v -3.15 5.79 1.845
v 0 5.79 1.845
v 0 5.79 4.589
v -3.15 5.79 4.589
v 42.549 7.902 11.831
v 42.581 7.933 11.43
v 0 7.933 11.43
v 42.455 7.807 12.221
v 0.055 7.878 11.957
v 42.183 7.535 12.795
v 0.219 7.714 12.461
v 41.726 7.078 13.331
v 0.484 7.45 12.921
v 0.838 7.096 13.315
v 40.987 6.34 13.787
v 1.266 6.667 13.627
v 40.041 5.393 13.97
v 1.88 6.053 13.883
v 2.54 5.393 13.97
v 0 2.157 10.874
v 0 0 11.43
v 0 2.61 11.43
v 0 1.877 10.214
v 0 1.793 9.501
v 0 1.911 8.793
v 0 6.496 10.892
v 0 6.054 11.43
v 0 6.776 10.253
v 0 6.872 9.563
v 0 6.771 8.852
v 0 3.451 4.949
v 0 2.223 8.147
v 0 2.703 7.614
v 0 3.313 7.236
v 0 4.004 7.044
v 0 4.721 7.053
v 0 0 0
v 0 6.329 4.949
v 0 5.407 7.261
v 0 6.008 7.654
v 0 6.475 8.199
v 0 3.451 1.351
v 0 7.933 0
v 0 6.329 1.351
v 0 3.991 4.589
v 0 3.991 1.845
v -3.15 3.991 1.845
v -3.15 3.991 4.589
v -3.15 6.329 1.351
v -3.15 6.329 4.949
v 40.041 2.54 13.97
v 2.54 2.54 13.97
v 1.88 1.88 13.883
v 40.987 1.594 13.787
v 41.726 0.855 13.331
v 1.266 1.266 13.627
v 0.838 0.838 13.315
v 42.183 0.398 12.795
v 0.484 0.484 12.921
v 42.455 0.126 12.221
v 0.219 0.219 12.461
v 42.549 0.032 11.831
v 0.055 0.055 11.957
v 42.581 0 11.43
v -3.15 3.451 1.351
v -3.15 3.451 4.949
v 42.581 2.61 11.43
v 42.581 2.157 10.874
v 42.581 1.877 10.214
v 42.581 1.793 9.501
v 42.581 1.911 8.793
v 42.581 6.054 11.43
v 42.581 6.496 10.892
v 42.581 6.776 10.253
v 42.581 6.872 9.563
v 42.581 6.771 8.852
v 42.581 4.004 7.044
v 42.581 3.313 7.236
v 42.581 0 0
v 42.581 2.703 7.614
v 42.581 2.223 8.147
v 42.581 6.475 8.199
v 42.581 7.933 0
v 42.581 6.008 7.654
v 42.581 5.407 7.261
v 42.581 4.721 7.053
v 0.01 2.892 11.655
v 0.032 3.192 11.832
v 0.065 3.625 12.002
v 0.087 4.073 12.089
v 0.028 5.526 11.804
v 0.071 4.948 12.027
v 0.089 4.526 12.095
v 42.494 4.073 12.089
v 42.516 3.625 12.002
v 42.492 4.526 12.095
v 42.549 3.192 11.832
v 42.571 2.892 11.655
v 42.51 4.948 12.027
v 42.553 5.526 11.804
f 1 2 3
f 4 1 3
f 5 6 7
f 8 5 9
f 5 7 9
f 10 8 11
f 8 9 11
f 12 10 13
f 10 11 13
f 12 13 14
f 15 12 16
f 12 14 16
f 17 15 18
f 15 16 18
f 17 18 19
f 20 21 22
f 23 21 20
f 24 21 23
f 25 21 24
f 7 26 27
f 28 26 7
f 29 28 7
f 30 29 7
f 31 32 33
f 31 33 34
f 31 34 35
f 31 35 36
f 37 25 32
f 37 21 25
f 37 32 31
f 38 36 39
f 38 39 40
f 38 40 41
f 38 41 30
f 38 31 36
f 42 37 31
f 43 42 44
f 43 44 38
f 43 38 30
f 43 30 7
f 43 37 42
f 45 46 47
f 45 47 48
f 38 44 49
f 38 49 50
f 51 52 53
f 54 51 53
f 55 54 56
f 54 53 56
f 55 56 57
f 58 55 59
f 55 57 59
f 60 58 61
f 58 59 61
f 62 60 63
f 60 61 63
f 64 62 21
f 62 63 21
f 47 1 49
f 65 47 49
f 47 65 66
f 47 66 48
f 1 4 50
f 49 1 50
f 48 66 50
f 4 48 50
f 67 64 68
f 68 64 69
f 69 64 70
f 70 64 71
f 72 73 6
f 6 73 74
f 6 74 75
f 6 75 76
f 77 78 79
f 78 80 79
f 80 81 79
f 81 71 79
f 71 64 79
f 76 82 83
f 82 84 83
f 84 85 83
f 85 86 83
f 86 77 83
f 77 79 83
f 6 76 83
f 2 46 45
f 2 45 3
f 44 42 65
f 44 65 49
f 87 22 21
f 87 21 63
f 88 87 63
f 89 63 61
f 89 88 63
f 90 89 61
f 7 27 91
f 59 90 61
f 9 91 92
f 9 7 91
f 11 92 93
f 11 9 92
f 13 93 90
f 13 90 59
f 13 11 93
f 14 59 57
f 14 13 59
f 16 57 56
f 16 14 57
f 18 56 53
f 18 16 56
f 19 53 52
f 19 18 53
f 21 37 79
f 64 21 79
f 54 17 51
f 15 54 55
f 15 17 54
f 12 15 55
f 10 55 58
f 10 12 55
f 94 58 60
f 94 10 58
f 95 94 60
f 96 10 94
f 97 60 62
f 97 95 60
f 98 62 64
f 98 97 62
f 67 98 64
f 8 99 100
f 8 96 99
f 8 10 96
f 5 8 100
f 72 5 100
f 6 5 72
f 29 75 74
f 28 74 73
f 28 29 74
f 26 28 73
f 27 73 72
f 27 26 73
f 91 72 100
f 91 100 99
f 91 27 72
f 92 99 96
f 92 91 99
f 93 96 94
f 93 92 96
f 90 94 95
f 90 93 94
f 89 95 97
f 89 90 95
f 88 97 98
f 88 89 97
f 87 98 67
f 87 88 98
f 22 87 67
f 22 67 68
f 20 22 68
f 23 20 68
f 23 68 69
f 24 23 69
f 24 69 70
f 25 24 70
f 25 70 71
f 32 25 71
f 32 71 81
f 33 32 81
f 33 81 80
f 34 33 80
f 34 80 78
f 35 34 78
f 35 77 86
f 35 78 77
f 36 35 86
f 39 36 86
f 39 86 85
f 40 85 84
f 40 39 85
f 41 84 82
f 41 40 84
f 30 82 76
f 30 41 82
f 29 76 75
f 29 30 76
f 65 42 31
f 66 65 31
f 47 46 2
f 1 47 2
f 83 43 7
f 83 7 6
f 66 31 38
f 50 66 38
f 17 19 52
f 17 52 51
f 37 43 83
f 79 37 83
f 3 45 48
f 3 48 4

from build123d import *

# Parameters (mm, degrees)
F0_W        = 42.580999434
F0_H        = 7.9333577305
F1_DEPTH    = 13.97
F2_R        = 2.54
F3_DEPTH    = 45.0342
F4_T1_DEPTH = 20.6333577305
F4_T3_DEPTH = 55.280999434
F5_W        = 2.8782505542
F5_H        = 3.5978133092
F5_W_2      = 1.7989068292
F5_H_2      = 2.7433328796
F6_DEPTH    = 3.1496


# Not quite as in the source:
# - a fillet or chamfer that OpenCascade refuses, or shapes differently, is made with other operations: its cross-section is extruded or revolved along the edge and cut away or added


with BuildPart() as f1:
    # F0 (on Top) → F1 (new body)
    with BuildSketch(Plane.XY):
        with Locations((21.290499717, 3.9666788653)):
            Rectangle(F0_W, F0_H)
    extrude(amount=F1_DEPTH)

    # F2 (on Right) → F3 (cut)
    with BuildSketch(Plane.YZ):
        with Locations((4.3319589458, 9.5625361428)):
            Circle(F2_R)
    extrude(amount=F3_DEPTH, mode=Mode.SUBTRACT)

    # F4: fillet of radius 2.54 on 4 edges, made by hand

    # F4_s2 → F4_t1 (cut)
    with BuildSketch(Plane.XZ.offset(-14.2833577305)):
        with BuildLine():
            ThreePointArc((0, 11.43), (0.7439487758, 13.2260512242), (2.54, 13.97))
            Line((2.54, 13.97), (0, 13.97))
            Line((0, 13.97), (0, 11.43))
        make_face()
        with BuildLine():
            ThreePointArc((40.040999434, 13.97), (41.8370506582, 13.2260512242), (42.580999434, 11.43))
            Line((42.580999434, 11.43), (42.580999434, 13.97))
            Line((42.580999434, 13.97), (40.040999434, 13.97))
        make_face()
    extrude(amount=F4_T1_DEPTH, mode=Mode.SUBTRACT)

    # F4_s4 → F4_t3 (cut)
    with BuildSketch(Plane.YZ.offset(-6.35)):
        with BuildLine():
            ThreePointArc((7.9333577305, 11.43), (7.1894089547, 13.2260512242), (5.3933577305, 13.97))
            Line((5.3933577305, 13.97), (7.9333577305, 13.97))
            Line((7.9333577305, 13.97), (7.9333577305, 11.43))
        make_face()
        with BuildLine():
            ThreePointArc((2.54, 13.97), (0.7439487758, 13.2260512242), (0, 11.43))
            Line((0, 11.43), (0, 13.97))
            Line((0, 13.97), (2.54, 13.97))
        make_face()
    extrude(amount=F4_T3_DEPTH, mode=Mode.SUBTRACT)

    # F5 (on Right) → F6 (join)
    with BuildSketch(Plane.YZ):
        with Locations((4.8902533017, 3.1496292795)):
            Rectangle(F5_W, F5_H)
        with Locations((4.8902535345, 3.2170884078)):
            Rectangle(F5_W_2, F5_H_2, mode=Mode.SUBTRACT)
    extrude(amount=-F6_DEPTH)


solid = f1.part
